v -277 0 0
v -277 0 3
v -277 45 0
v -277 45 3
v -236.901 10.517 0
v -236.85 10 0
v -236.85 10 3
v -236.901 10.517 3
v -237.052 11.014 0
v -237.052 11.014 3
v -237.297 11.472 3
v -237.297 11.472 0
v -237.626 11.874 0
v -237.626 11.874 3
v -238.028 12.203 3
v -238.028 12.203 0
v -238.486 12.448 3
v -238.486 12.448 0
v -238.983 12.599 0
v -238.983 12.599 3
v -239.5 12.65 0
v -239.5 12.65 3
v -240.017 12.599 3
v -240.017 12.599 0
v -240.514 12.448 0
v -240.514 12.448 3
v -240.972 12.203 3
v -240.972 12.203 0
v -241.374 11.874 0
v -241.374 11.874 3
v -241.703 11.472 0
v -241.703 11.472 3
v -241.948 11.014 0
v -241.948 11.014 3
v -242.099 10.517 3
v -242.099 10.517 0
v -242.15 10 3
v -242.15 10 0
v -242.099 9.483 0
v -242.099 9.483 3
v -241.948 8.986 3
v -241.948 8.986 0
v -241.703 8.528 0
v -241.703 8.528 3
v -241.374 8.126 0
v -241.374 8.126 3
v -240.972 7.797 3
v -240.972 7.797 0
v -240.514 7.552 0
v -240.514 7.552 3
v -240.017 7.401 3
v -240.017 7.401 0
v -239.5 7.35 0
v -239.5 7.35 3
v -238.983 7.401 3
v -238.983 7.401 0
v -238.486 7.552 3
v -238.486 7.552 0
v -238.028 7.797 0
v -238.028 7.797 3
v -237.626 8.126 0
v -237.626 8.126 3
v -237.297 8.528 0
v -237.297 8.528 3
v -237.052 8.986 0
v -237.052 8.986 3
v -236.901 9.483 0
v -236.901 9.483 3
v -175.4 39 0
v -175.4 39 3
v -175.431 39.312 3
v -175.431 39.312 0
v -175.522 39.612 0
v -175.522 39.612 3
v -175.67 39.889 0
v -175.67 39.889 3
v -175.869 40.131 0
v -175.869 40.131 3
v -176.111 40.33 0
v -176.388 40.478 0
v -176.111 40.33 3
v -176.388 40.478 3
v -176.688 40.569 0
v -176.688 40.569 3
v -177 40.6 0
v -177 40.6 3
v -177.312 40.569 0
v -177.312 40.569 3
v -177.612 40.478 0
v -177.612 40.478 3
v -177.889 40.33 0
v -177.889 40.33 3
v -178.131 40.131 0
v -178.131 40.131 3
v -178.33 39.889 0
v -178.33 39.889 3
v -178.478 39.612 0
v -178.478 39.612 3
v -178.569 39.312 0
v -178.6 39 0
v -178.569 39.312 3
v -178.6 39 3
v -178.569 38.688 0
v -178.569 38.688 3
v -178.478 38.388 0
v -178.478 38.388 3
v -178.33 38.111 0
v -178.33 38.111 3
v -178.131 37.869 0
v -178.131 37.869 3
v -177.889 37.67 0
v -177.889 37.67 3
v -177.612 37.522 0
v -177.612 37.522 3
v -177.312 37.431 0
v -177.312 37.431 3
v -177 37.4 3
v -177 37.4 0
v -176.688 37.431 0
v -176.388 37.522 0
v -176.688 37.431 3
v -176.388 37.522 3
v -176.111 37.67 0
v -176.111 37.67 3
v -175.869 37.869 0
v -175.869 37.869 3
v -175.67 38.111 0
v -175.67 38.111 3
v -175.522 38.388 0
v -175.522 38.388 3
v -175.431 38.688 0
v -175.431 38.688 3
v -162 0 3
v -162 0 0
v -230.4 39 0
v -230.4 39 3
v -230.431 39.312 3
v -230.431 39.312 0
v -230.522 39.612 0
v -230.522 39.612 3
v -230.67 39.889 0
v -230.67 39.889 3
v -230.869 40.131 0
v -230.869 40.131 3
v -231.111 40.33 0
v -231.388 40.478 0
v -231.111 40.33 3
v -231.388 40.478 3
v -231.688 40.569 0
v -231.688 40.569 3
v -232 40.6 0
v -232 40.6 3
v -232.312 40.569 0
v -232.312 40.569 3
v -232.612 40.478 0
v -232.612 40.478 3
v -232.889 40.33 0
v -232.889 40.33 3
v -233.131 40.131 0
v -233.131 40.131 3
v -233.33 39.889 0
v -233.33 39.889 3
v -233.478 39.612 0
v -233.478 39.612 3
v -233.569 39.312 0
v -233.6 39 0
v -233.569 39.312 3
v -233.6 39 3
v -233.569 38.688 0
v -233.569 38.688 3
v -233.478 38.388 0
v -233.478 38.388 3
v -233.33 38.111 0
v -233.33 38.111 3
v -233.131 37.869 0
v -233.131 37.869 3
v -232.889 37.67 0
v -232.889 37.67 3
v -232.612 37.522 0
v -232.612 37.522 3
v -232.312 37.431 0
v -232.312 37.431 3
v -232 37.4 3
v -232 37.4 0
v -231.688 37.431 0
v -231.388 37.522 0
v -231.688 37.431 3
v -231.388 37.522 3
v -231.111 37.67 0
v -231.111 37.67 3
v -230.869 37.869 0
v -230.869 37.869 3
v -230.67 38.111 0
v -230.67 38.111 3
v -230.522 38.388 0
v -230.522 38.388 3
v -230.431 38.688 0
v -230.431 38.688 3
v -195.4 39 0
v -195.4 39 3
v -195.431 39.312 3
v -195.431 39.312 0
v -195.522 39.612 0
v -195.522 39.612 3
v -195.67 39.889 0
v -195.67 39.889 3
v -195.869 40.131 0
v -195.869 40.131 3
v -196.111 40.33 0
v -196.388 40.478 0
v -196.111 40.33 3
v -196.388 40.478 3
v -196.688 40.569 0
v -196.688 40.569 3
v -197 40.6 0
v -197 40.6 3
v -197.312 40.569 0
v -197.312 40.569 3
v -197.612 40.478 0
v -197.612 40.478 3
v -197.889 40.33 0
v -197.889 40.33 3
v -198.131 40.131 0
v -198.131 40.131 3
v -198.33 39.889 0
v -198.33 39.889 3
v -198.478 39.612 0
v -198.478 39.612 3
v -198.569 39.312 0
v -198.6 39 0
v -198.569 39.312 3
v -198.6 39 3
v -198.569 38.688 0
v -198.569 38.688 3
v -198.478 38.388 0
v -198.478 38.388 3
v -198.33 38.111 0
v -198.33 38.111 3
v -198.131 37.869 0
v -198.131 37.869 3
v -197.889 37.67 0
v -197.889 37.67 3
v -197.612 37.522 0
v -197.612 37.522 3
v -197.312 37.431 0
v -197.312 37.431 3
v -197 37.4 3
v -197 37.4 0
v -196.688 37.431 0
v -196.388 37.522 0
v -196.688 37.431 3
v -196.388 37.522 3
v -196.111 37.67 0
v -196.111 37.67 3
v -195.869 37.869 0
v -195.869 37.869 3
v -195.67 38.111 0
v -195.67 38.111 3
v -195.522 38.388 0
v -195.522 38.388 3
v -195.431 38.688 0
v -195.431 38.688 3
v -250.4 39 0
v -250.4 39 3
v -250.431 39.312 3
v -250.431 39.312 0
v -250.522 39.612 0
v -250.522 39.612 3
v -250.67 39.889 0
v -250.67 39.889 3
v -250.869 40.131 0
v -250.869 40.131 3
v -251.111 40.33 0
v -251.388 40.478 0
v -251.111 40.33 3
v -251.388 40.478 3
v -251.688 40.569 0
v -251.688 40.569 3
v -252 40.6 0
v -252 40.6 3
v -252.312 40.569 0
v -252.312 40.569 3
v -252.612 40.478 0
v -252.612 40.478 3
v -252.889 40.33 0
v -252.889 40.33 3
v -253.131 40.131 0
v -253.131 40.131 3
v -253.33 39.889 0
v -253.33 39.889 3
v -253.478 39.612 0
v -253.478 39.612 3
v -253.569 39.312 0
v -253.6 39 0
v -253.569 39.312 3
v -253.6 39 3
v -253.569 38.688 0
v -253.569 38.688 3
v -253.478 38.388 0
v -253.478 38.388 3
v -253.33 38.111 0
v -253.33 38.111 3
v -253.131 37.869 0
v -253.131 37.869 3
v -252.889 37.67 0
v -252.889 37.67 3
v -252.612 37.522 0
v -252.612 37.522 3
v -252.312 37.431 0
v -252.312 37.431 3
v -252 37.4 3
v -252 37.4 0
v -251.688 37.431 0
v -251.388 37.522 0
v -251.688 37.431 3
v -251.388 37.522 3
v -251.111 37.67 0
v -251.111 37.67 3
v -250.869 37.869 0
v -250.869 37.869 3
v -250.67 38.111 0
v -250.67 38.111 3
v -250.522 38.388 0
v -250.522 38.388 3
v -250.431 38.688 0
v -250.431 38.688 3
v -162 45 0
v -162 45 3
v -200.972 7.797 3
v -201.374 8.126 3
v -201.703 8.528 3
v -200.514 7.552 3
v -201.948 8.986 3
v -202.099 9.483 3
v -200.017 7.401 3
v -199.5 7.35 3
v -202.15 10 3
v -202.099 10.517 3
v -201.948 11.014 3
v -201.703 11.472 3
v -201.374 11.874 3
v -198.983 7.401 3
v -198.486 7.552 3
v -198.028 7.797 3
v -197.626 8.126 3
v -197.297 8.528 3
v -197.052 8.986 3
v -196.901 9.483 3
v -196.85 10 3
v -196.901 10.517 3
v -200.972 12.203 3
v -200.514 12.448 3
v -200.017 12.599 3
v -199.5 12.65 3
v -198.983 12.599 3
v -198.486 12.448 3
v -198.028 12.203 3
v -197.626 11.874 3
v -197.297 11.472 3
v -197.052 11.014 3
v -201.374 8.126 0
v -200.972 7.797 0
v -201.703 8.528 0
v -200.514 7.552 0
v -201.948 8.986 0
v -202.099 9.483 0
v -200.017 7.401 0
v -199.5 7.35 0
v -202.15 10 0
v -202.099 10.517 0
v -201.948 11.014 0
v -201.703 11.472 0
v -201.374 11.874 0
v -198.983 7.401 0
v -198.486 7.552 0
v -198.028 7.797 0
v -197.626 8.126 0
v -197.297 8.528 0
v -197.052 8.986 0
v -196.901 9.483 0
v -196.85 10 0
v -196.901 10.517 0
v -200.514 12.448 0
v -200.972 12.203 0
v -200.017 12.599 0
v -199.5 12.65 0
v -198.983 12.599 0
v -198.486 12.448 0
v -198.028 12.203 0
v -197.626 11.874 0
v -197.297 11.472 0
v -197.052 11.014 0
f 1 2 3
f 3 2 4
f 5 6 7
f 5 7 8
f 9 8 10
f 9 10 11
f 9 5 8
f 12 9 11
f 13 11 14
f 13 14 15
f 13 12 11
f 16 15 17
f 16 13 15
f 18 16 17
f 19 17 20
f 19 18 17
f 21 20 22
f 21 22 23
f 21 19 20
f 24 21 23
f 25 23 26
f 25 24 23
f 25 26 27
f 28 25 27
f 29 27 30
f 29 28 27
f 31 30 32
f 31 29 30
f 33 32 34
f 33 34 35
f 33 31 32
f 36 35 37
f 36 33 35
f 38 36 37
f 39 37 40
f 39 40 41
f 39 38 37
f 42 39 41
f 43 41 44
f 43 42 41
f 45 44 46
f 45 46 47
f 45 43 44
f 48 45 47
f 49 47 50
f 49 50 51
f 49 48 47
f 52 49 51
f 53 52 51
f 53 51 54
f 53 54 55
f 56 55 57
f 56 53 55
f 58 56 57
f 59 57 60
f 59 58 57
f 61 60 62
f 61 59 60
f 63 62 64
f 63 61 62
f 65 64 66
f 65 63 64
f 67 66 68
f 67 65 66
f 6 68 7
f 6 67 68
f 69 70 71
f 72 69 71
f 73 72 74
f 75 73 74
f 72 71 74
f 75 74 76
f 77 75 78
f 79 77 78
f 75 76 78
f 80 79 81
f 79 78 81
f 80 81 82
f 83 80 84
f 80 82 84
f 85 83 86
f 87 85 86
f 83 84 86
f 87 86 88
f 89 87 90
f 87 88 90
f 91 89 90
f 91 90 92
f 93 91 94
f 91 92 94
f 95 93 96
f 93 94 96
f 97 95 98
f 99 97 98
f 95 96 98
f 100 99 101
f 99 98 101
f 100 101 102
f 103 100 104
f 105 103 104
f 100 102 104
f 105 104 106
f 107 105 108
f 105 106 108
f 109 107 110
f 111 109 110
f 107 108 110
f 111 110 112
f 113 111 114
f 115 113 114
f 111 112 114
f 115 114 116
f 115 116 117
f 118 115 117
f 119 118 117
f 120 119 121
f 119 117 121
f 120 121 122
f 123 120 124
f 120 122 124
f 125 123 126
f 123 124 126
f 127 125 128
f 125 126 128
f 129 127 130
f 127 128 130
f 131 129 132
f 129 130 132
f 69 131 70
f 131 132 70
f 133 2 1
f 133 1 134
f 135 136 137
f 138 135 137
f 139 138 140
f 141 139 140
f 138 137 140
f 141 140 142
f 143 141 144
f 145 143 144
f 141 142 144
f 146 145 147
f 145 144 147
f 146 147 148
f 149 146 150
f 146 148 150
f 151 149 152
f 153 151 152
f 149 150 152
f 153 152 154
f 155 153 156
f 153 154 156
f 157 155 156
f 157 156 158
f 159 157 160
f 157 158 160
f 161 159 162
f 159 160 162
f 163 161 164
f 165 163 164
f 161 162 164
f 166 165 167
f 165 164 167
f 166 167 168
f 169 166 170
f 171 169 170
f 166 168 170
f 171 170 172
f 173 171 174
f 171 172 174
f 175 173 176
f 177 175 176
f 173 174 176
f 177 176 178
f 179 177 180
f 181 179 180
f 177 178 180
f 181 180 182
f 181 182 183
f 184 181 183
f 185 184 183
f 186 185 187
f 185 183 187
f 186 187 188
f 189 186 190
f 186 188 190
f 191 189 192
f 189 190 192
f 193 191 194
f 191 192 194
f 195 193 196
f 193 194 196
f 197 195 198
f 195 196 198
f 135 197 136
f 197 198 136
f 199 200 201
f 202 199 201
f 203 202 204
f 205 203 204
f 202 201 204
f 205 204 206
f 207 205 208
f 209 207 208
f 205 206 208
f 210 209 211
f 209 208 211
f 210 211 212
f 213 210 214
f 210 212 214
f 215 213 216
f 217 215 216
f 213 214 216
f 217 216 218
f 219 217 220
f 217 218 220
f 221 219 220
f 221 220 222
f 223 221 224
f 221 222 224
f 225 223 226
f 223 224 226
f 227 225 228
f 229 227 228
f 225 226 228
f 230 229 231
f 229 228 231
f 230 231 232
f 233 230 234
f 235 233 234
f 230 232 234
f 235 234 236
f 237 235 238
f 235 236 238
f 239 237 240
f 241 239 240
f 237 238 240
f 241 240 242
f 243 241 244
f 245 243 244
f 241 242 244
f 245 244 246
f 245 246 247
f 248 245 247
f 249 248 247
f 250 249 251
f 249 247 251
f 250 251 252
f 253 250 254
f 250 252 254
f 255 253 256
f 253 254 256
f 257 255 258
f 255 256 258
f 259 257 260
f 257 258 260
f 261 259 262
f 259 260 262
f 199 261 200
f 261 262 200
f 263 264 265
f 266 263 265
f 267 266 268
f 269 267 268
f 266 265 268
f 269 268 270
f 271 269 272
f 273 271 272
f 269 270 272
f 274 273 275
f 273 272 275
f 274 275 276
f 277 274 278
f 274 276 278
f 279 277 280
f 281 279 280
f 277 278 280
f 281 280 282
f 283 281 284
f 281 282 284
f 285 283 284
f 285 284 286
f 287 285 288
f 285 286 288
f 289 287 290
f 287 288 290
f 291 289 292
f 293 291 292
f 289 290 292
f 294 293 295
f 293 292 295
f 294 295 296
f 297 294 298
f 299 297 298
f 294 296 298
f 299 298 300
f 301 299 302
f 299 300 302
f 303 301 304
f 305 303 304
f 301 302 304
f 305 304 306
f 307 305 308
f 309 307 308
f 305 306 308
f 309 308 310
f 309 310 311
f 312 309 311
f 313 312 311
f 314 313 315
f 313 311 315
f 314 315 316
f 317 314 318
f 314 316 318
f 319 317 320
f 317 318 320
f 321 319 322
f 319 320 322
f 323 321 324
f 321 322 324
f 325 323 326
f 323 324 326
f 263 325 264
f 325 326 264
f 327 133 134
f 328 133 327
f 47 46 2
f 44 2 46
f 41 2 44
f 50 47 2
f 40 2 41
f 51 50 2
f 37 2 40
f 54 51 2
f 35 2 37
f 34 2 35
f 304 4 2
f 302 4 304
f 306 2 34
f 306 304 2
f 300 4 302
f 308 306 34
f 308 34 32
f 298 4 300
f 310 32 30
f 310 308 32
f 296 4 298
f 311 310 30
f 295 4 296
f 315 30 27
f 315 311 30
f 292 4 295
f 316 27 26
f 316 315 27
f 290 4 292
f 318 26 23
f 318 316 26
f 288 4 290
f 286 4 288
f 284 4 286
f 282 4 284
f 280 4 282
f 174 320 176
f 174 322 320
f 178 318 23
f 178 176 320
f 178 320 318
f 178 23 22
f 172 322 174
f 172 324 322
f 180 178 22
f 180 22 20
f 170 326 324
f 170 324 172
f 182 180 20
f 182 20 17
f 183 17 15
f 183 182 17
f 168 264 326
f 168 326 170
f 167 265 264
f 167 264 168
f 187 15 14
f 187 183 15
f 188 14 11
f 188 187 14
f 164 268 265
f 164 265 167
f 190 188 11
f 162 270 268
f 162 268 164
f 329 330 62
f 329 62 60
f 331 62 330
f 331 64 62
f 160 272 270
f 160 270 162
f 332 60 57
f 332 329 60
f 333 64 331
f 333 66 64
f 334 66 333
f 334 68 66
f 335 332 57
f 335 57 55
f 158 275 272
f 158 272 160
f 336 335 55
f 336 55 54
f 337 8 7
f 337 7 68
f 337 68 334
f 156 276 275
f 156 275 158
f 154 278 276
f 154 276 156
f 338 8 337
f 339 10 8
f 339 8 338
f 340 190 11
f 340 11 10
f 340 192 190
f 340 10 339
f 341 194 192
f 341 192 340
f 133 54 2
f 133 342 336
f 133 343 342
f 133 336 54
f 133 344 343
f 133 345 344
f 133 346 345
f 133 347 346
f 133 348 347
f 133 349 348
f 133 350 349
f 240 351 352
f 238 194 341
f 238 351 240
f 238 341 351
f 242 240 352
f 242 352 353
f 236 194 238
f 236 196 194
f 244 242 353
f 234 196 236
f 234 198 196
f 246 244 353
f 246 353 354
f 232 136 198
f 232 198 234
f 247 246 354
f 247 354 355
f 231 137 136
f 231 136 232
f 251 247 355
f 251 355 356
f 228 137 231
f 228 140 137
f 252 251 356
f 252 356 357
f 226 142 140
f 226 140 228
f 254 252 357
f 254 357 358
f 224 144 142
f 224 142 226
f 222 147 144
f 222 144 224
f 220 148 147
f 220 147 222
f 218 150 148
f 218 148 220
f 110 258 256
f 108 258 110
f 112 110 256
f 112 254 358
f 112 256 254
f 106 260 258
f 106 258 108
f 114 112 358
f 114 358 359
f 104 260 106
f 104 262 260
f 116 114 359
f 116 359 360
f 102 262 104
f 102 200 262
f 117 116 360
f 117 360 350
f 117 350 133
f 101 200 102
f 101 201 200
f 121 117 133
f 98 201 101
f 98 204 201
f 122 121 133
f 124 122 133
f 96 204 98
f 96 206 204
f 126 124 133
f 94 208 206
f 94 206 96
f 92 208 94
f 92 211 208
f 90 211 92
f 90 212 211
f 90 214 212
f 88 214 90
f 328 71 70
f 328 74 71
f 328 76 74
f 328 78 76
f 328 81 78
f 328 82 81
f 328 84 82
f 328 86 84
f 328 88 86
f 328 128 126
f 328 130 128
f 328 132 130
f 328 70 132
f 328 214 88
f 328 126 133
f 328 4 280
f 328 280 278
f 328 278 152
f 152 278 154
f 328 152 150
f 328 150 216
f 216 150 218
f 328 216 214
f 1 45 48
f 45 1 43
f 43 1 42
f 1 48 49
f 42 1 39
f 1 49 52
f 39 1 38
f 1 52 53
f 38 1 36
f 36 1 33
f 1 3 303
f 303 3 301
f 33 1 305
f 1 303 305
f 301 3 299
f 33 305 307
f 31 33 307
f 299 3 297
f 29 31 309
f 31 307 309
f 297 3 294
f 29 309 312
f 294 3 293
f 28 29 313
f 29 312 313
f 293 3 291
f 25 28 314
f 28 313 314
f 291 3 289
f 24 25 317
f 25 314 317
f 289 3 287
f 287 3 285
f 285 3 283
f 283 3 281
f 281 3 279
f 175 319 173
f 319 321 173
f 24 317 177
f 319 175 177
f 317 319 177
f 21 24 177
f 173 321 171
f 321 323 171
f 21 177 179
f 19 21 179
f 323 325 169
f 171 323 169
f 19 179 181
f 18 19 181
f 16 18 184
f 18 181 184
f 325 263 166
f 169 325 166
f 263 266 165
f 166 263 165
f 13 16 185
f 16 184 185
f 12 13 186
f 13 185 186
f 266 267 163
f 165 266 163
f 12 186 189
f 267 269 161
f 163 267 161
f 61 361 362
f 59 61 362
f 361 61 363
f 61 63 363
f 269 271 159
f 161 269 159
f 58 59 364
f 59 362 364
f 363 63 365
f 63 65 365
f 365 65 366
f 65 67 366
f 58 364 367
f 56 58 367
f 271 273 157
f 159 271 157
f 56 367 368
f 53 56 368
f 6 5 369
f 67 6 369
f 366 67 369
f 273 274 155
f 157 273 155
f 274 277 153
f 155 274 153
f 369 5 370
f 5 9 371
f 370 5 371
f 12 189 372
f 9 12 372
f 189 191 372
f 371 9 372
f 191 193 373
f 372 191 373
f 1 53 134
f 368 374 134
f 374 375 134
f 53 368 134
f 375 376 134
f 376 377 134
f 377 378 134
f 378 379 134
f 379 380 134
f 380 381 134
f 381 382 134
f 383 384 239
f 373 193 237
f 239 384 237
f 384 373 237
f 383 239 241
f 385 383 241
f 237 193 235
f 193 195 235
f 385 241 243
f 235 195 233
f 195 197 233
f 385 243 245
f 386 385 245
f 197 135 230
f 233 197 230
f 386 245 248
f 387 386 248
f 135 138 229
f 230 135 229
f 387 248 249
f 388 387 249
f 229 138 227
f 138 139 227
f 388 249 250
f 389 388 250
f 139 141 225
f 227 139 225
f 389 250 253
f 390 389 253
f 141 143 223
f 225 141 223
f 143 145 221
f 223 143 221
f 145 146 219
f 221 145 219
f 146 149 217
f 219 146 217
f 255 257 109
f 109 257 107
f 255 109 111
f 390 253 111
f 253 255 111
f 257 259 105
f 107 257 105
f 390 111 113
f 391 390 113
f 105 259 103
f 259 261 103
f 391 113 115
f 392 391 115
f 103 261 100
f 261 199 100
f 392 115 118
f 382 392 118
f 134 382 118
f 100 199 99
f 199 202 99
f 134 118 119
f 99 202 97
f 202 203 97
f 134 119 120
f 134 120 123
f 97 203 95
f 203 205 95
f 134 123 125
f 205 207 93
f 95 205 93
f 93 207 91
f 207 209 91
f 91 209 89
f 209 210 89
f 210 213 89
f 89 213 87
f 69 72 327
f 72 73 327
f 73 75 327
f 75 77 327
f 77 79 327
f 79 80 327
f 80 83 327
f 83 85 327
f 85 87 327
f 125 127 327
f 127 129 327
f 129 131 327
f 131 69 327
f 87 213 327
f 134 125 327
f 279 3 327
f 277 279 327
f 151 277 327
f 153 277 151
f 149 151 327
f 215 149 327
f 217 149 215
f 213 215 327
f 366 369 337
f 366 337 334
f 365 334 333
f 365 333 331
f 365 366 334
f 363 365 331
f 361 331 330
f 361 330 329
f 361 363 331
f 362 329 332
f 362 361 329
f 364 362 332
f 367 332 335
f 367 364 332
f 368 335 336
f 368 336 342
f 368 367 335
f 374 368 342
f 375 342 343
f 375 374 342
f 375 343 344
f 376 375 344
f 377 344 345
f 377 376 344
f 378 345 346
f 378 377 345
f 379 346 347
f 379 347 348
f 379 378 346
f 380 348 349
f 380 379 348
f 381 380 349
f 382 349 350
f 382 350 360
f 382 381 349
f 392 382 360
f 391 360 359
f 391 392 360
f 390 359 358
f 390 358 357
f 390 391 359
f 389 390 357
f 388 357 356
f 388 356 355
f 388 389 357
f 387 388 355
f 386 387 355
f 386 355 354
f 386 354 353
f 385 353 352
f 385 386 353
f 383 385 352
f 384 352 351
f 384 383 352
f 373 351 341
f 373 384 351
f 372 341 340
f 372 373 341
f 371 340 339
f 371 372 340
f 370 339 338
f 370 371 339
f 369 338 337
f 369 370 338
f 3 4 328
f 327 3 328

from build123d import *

# Parameters (mm, degrees)
SKETCH_1_W          = 75
SKETCH_1_H          = 45
SKETCH_1_R          = 2.65
EXTRUDE_1_DEPTH     = 3
SKETCH_2_W          = 20
SKETCH_2_H          = 45
EXTRUDE_2_DEPTH     = 3
SKETCH_3_R          = 1.6
CUT_EXTRUDE_1_DEPTH = 3
SKETCH_4_W          = 20
SKETCH_4_H          = 45
EXTRUDE_3_DEPTH     = 3


with BuildPart() as part:
    # 草图1 → 凸台-拉伸1 (new body)
    with BuildSketch(Plane.XY):
        with Locations((-219.5, 22.5)):
            Rectangle(SKETCH_1_W, SKETCH_1_H)
        with Locations((-239.5, 10)):
            Circle(SKETCH_1_R, mode=Mode.SUBTRACT)
        with Locations(Location((-199.5, 10, 0), (0, 0, 180))):
            Circle(SKETCH_1_R, mode=Mode.SUBTRACT)
    extrude(amount=EXTRUDE_1_DEPTH)

    # 草图2 → 凸台-拉伸2 (add)
    with BuildSketch(Plane.XY.offset(3)):
        with Locations((-172, 22.5)):
            Rectangle(SKETCH_2_W, SKETCH_2_H)
    extrude(amount=-EXTRUDE_2_DEPTH)

    # 草图3 → 切除-拉伸1 (cut)
    with BuildSketch(Plane.XY.offset(3)):
        with Locations((-197, 39)):
            Circle(SKETCH_3_R)
        with Locations((-177, 39)):
            Circle(SKETCH_3_R)
        with Locations((-232, 39)):
            Circle(SKETCH_3_R)
        with Locations((-252, 39)):
            Circle(SKETCH_3_R)
    extrude(amount=-CUT_EXTRUDE_1_DEPTH, mode=Mode.SUBTRACT)

    # 草图4 → 凸台-拉伸3 (add)
    with BuildSketch(Plane.XY.offset(3)):
        with Locations((-267, 22.5)):
            Rectangle(SKETCH_4_W, SKETCH_4_H)
    extrude(amount=-EXTRUDE_3_DEPTH)


solid = part.part
